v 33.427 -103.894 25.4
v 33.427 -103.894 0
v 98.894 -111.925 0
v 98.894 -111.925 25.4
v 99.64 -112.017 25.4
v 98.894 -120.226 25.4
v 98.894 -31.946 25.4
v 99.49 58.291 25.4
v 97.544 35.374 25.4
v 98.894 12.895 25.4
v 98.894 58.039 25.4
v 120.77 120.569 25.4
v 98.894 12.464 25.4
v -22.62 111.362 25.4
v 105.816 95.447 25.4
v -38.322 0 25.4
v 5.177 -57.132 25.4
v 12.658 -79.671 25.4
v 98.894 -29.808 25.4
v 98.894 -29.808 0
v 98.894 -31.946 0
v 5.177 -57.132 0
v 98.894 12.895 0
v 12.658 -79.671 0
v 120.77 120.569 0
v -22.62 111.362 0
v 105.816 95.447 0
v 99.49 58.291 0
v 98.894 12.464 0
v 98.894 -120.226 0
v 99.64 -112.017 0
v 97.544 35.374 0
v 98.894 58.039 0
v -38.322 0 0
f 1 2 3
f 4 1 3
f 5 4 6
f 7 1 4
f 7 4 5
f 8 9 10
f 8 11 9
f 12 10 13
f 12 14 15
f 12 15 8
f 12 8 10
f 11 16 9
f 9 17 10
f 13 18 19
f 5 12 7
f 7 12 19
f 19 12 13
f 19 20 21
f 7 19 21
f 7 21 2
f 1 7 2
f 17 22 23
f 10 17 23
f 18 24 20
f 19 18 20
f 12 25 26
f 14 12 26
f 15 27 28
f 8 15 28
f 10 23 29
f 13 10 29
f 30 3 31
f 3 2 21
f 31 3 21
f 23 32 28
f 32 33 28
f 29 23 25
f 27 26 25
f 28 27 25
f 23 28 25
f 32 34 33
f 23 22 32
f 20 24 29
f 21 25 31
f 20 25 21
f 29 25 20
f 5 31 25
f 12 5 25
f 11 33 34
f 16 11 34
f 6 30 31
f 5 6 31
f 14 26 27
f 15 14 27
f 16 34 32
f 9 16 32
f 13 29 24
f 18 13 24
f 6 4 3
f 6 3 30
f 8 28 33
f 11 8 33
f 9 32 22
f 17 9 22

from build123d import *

# Parameters (mm, degrees)
F1_DEPTH = 25.4


with BuildPart() as f1:
    # F0 (on Top) → F1 (new body)
    with BuildSketch(Plane.XY):
        Polygon((99.490069, 58.291368), (98.893963, 58.039229), (98.893963, 12.895242), (100.236297, 13.898268), (98.893963, 12.464104), (98.893963, -29.808243), (102.997907, -27.43528), (98.893963, -31.945548), (98.893963, -111.925168), (99.639752, -112.016652), (120.770343, 120.569244), (-22.619633, 111.361951), (105.815612, 95.447481), align=None)
        Polygon((98.893963, 12.895242), (98.893963, 58.039229), (-38.321942, 0), (97.543553, 35.373725), (5.177082, -57.132415), align=None)
        Polygon((100.236297, 13.898268), (98.893963, 12.895242), (98.893963, 12.464104), align=None)
        Polygon((98.893963, -29.808243), (98.893963, 12.464104), (12.658387, -79.670966), align=None)
        Polygon((102.997907, -27.43528), (98.893963, -29.808243), (98.893963, -31.945548), align=None)
        Polygon((98.893963, -111.925168), (98.893963, -31.945548), (33.426806, -103.894494), align=None)
        Polygon((99.639752, -112.016652), (98.893963, -111.925168), (98.893963, -120.225601), align=None)
    extrude(amount=F1_DEPTH)


solid = f1.part
